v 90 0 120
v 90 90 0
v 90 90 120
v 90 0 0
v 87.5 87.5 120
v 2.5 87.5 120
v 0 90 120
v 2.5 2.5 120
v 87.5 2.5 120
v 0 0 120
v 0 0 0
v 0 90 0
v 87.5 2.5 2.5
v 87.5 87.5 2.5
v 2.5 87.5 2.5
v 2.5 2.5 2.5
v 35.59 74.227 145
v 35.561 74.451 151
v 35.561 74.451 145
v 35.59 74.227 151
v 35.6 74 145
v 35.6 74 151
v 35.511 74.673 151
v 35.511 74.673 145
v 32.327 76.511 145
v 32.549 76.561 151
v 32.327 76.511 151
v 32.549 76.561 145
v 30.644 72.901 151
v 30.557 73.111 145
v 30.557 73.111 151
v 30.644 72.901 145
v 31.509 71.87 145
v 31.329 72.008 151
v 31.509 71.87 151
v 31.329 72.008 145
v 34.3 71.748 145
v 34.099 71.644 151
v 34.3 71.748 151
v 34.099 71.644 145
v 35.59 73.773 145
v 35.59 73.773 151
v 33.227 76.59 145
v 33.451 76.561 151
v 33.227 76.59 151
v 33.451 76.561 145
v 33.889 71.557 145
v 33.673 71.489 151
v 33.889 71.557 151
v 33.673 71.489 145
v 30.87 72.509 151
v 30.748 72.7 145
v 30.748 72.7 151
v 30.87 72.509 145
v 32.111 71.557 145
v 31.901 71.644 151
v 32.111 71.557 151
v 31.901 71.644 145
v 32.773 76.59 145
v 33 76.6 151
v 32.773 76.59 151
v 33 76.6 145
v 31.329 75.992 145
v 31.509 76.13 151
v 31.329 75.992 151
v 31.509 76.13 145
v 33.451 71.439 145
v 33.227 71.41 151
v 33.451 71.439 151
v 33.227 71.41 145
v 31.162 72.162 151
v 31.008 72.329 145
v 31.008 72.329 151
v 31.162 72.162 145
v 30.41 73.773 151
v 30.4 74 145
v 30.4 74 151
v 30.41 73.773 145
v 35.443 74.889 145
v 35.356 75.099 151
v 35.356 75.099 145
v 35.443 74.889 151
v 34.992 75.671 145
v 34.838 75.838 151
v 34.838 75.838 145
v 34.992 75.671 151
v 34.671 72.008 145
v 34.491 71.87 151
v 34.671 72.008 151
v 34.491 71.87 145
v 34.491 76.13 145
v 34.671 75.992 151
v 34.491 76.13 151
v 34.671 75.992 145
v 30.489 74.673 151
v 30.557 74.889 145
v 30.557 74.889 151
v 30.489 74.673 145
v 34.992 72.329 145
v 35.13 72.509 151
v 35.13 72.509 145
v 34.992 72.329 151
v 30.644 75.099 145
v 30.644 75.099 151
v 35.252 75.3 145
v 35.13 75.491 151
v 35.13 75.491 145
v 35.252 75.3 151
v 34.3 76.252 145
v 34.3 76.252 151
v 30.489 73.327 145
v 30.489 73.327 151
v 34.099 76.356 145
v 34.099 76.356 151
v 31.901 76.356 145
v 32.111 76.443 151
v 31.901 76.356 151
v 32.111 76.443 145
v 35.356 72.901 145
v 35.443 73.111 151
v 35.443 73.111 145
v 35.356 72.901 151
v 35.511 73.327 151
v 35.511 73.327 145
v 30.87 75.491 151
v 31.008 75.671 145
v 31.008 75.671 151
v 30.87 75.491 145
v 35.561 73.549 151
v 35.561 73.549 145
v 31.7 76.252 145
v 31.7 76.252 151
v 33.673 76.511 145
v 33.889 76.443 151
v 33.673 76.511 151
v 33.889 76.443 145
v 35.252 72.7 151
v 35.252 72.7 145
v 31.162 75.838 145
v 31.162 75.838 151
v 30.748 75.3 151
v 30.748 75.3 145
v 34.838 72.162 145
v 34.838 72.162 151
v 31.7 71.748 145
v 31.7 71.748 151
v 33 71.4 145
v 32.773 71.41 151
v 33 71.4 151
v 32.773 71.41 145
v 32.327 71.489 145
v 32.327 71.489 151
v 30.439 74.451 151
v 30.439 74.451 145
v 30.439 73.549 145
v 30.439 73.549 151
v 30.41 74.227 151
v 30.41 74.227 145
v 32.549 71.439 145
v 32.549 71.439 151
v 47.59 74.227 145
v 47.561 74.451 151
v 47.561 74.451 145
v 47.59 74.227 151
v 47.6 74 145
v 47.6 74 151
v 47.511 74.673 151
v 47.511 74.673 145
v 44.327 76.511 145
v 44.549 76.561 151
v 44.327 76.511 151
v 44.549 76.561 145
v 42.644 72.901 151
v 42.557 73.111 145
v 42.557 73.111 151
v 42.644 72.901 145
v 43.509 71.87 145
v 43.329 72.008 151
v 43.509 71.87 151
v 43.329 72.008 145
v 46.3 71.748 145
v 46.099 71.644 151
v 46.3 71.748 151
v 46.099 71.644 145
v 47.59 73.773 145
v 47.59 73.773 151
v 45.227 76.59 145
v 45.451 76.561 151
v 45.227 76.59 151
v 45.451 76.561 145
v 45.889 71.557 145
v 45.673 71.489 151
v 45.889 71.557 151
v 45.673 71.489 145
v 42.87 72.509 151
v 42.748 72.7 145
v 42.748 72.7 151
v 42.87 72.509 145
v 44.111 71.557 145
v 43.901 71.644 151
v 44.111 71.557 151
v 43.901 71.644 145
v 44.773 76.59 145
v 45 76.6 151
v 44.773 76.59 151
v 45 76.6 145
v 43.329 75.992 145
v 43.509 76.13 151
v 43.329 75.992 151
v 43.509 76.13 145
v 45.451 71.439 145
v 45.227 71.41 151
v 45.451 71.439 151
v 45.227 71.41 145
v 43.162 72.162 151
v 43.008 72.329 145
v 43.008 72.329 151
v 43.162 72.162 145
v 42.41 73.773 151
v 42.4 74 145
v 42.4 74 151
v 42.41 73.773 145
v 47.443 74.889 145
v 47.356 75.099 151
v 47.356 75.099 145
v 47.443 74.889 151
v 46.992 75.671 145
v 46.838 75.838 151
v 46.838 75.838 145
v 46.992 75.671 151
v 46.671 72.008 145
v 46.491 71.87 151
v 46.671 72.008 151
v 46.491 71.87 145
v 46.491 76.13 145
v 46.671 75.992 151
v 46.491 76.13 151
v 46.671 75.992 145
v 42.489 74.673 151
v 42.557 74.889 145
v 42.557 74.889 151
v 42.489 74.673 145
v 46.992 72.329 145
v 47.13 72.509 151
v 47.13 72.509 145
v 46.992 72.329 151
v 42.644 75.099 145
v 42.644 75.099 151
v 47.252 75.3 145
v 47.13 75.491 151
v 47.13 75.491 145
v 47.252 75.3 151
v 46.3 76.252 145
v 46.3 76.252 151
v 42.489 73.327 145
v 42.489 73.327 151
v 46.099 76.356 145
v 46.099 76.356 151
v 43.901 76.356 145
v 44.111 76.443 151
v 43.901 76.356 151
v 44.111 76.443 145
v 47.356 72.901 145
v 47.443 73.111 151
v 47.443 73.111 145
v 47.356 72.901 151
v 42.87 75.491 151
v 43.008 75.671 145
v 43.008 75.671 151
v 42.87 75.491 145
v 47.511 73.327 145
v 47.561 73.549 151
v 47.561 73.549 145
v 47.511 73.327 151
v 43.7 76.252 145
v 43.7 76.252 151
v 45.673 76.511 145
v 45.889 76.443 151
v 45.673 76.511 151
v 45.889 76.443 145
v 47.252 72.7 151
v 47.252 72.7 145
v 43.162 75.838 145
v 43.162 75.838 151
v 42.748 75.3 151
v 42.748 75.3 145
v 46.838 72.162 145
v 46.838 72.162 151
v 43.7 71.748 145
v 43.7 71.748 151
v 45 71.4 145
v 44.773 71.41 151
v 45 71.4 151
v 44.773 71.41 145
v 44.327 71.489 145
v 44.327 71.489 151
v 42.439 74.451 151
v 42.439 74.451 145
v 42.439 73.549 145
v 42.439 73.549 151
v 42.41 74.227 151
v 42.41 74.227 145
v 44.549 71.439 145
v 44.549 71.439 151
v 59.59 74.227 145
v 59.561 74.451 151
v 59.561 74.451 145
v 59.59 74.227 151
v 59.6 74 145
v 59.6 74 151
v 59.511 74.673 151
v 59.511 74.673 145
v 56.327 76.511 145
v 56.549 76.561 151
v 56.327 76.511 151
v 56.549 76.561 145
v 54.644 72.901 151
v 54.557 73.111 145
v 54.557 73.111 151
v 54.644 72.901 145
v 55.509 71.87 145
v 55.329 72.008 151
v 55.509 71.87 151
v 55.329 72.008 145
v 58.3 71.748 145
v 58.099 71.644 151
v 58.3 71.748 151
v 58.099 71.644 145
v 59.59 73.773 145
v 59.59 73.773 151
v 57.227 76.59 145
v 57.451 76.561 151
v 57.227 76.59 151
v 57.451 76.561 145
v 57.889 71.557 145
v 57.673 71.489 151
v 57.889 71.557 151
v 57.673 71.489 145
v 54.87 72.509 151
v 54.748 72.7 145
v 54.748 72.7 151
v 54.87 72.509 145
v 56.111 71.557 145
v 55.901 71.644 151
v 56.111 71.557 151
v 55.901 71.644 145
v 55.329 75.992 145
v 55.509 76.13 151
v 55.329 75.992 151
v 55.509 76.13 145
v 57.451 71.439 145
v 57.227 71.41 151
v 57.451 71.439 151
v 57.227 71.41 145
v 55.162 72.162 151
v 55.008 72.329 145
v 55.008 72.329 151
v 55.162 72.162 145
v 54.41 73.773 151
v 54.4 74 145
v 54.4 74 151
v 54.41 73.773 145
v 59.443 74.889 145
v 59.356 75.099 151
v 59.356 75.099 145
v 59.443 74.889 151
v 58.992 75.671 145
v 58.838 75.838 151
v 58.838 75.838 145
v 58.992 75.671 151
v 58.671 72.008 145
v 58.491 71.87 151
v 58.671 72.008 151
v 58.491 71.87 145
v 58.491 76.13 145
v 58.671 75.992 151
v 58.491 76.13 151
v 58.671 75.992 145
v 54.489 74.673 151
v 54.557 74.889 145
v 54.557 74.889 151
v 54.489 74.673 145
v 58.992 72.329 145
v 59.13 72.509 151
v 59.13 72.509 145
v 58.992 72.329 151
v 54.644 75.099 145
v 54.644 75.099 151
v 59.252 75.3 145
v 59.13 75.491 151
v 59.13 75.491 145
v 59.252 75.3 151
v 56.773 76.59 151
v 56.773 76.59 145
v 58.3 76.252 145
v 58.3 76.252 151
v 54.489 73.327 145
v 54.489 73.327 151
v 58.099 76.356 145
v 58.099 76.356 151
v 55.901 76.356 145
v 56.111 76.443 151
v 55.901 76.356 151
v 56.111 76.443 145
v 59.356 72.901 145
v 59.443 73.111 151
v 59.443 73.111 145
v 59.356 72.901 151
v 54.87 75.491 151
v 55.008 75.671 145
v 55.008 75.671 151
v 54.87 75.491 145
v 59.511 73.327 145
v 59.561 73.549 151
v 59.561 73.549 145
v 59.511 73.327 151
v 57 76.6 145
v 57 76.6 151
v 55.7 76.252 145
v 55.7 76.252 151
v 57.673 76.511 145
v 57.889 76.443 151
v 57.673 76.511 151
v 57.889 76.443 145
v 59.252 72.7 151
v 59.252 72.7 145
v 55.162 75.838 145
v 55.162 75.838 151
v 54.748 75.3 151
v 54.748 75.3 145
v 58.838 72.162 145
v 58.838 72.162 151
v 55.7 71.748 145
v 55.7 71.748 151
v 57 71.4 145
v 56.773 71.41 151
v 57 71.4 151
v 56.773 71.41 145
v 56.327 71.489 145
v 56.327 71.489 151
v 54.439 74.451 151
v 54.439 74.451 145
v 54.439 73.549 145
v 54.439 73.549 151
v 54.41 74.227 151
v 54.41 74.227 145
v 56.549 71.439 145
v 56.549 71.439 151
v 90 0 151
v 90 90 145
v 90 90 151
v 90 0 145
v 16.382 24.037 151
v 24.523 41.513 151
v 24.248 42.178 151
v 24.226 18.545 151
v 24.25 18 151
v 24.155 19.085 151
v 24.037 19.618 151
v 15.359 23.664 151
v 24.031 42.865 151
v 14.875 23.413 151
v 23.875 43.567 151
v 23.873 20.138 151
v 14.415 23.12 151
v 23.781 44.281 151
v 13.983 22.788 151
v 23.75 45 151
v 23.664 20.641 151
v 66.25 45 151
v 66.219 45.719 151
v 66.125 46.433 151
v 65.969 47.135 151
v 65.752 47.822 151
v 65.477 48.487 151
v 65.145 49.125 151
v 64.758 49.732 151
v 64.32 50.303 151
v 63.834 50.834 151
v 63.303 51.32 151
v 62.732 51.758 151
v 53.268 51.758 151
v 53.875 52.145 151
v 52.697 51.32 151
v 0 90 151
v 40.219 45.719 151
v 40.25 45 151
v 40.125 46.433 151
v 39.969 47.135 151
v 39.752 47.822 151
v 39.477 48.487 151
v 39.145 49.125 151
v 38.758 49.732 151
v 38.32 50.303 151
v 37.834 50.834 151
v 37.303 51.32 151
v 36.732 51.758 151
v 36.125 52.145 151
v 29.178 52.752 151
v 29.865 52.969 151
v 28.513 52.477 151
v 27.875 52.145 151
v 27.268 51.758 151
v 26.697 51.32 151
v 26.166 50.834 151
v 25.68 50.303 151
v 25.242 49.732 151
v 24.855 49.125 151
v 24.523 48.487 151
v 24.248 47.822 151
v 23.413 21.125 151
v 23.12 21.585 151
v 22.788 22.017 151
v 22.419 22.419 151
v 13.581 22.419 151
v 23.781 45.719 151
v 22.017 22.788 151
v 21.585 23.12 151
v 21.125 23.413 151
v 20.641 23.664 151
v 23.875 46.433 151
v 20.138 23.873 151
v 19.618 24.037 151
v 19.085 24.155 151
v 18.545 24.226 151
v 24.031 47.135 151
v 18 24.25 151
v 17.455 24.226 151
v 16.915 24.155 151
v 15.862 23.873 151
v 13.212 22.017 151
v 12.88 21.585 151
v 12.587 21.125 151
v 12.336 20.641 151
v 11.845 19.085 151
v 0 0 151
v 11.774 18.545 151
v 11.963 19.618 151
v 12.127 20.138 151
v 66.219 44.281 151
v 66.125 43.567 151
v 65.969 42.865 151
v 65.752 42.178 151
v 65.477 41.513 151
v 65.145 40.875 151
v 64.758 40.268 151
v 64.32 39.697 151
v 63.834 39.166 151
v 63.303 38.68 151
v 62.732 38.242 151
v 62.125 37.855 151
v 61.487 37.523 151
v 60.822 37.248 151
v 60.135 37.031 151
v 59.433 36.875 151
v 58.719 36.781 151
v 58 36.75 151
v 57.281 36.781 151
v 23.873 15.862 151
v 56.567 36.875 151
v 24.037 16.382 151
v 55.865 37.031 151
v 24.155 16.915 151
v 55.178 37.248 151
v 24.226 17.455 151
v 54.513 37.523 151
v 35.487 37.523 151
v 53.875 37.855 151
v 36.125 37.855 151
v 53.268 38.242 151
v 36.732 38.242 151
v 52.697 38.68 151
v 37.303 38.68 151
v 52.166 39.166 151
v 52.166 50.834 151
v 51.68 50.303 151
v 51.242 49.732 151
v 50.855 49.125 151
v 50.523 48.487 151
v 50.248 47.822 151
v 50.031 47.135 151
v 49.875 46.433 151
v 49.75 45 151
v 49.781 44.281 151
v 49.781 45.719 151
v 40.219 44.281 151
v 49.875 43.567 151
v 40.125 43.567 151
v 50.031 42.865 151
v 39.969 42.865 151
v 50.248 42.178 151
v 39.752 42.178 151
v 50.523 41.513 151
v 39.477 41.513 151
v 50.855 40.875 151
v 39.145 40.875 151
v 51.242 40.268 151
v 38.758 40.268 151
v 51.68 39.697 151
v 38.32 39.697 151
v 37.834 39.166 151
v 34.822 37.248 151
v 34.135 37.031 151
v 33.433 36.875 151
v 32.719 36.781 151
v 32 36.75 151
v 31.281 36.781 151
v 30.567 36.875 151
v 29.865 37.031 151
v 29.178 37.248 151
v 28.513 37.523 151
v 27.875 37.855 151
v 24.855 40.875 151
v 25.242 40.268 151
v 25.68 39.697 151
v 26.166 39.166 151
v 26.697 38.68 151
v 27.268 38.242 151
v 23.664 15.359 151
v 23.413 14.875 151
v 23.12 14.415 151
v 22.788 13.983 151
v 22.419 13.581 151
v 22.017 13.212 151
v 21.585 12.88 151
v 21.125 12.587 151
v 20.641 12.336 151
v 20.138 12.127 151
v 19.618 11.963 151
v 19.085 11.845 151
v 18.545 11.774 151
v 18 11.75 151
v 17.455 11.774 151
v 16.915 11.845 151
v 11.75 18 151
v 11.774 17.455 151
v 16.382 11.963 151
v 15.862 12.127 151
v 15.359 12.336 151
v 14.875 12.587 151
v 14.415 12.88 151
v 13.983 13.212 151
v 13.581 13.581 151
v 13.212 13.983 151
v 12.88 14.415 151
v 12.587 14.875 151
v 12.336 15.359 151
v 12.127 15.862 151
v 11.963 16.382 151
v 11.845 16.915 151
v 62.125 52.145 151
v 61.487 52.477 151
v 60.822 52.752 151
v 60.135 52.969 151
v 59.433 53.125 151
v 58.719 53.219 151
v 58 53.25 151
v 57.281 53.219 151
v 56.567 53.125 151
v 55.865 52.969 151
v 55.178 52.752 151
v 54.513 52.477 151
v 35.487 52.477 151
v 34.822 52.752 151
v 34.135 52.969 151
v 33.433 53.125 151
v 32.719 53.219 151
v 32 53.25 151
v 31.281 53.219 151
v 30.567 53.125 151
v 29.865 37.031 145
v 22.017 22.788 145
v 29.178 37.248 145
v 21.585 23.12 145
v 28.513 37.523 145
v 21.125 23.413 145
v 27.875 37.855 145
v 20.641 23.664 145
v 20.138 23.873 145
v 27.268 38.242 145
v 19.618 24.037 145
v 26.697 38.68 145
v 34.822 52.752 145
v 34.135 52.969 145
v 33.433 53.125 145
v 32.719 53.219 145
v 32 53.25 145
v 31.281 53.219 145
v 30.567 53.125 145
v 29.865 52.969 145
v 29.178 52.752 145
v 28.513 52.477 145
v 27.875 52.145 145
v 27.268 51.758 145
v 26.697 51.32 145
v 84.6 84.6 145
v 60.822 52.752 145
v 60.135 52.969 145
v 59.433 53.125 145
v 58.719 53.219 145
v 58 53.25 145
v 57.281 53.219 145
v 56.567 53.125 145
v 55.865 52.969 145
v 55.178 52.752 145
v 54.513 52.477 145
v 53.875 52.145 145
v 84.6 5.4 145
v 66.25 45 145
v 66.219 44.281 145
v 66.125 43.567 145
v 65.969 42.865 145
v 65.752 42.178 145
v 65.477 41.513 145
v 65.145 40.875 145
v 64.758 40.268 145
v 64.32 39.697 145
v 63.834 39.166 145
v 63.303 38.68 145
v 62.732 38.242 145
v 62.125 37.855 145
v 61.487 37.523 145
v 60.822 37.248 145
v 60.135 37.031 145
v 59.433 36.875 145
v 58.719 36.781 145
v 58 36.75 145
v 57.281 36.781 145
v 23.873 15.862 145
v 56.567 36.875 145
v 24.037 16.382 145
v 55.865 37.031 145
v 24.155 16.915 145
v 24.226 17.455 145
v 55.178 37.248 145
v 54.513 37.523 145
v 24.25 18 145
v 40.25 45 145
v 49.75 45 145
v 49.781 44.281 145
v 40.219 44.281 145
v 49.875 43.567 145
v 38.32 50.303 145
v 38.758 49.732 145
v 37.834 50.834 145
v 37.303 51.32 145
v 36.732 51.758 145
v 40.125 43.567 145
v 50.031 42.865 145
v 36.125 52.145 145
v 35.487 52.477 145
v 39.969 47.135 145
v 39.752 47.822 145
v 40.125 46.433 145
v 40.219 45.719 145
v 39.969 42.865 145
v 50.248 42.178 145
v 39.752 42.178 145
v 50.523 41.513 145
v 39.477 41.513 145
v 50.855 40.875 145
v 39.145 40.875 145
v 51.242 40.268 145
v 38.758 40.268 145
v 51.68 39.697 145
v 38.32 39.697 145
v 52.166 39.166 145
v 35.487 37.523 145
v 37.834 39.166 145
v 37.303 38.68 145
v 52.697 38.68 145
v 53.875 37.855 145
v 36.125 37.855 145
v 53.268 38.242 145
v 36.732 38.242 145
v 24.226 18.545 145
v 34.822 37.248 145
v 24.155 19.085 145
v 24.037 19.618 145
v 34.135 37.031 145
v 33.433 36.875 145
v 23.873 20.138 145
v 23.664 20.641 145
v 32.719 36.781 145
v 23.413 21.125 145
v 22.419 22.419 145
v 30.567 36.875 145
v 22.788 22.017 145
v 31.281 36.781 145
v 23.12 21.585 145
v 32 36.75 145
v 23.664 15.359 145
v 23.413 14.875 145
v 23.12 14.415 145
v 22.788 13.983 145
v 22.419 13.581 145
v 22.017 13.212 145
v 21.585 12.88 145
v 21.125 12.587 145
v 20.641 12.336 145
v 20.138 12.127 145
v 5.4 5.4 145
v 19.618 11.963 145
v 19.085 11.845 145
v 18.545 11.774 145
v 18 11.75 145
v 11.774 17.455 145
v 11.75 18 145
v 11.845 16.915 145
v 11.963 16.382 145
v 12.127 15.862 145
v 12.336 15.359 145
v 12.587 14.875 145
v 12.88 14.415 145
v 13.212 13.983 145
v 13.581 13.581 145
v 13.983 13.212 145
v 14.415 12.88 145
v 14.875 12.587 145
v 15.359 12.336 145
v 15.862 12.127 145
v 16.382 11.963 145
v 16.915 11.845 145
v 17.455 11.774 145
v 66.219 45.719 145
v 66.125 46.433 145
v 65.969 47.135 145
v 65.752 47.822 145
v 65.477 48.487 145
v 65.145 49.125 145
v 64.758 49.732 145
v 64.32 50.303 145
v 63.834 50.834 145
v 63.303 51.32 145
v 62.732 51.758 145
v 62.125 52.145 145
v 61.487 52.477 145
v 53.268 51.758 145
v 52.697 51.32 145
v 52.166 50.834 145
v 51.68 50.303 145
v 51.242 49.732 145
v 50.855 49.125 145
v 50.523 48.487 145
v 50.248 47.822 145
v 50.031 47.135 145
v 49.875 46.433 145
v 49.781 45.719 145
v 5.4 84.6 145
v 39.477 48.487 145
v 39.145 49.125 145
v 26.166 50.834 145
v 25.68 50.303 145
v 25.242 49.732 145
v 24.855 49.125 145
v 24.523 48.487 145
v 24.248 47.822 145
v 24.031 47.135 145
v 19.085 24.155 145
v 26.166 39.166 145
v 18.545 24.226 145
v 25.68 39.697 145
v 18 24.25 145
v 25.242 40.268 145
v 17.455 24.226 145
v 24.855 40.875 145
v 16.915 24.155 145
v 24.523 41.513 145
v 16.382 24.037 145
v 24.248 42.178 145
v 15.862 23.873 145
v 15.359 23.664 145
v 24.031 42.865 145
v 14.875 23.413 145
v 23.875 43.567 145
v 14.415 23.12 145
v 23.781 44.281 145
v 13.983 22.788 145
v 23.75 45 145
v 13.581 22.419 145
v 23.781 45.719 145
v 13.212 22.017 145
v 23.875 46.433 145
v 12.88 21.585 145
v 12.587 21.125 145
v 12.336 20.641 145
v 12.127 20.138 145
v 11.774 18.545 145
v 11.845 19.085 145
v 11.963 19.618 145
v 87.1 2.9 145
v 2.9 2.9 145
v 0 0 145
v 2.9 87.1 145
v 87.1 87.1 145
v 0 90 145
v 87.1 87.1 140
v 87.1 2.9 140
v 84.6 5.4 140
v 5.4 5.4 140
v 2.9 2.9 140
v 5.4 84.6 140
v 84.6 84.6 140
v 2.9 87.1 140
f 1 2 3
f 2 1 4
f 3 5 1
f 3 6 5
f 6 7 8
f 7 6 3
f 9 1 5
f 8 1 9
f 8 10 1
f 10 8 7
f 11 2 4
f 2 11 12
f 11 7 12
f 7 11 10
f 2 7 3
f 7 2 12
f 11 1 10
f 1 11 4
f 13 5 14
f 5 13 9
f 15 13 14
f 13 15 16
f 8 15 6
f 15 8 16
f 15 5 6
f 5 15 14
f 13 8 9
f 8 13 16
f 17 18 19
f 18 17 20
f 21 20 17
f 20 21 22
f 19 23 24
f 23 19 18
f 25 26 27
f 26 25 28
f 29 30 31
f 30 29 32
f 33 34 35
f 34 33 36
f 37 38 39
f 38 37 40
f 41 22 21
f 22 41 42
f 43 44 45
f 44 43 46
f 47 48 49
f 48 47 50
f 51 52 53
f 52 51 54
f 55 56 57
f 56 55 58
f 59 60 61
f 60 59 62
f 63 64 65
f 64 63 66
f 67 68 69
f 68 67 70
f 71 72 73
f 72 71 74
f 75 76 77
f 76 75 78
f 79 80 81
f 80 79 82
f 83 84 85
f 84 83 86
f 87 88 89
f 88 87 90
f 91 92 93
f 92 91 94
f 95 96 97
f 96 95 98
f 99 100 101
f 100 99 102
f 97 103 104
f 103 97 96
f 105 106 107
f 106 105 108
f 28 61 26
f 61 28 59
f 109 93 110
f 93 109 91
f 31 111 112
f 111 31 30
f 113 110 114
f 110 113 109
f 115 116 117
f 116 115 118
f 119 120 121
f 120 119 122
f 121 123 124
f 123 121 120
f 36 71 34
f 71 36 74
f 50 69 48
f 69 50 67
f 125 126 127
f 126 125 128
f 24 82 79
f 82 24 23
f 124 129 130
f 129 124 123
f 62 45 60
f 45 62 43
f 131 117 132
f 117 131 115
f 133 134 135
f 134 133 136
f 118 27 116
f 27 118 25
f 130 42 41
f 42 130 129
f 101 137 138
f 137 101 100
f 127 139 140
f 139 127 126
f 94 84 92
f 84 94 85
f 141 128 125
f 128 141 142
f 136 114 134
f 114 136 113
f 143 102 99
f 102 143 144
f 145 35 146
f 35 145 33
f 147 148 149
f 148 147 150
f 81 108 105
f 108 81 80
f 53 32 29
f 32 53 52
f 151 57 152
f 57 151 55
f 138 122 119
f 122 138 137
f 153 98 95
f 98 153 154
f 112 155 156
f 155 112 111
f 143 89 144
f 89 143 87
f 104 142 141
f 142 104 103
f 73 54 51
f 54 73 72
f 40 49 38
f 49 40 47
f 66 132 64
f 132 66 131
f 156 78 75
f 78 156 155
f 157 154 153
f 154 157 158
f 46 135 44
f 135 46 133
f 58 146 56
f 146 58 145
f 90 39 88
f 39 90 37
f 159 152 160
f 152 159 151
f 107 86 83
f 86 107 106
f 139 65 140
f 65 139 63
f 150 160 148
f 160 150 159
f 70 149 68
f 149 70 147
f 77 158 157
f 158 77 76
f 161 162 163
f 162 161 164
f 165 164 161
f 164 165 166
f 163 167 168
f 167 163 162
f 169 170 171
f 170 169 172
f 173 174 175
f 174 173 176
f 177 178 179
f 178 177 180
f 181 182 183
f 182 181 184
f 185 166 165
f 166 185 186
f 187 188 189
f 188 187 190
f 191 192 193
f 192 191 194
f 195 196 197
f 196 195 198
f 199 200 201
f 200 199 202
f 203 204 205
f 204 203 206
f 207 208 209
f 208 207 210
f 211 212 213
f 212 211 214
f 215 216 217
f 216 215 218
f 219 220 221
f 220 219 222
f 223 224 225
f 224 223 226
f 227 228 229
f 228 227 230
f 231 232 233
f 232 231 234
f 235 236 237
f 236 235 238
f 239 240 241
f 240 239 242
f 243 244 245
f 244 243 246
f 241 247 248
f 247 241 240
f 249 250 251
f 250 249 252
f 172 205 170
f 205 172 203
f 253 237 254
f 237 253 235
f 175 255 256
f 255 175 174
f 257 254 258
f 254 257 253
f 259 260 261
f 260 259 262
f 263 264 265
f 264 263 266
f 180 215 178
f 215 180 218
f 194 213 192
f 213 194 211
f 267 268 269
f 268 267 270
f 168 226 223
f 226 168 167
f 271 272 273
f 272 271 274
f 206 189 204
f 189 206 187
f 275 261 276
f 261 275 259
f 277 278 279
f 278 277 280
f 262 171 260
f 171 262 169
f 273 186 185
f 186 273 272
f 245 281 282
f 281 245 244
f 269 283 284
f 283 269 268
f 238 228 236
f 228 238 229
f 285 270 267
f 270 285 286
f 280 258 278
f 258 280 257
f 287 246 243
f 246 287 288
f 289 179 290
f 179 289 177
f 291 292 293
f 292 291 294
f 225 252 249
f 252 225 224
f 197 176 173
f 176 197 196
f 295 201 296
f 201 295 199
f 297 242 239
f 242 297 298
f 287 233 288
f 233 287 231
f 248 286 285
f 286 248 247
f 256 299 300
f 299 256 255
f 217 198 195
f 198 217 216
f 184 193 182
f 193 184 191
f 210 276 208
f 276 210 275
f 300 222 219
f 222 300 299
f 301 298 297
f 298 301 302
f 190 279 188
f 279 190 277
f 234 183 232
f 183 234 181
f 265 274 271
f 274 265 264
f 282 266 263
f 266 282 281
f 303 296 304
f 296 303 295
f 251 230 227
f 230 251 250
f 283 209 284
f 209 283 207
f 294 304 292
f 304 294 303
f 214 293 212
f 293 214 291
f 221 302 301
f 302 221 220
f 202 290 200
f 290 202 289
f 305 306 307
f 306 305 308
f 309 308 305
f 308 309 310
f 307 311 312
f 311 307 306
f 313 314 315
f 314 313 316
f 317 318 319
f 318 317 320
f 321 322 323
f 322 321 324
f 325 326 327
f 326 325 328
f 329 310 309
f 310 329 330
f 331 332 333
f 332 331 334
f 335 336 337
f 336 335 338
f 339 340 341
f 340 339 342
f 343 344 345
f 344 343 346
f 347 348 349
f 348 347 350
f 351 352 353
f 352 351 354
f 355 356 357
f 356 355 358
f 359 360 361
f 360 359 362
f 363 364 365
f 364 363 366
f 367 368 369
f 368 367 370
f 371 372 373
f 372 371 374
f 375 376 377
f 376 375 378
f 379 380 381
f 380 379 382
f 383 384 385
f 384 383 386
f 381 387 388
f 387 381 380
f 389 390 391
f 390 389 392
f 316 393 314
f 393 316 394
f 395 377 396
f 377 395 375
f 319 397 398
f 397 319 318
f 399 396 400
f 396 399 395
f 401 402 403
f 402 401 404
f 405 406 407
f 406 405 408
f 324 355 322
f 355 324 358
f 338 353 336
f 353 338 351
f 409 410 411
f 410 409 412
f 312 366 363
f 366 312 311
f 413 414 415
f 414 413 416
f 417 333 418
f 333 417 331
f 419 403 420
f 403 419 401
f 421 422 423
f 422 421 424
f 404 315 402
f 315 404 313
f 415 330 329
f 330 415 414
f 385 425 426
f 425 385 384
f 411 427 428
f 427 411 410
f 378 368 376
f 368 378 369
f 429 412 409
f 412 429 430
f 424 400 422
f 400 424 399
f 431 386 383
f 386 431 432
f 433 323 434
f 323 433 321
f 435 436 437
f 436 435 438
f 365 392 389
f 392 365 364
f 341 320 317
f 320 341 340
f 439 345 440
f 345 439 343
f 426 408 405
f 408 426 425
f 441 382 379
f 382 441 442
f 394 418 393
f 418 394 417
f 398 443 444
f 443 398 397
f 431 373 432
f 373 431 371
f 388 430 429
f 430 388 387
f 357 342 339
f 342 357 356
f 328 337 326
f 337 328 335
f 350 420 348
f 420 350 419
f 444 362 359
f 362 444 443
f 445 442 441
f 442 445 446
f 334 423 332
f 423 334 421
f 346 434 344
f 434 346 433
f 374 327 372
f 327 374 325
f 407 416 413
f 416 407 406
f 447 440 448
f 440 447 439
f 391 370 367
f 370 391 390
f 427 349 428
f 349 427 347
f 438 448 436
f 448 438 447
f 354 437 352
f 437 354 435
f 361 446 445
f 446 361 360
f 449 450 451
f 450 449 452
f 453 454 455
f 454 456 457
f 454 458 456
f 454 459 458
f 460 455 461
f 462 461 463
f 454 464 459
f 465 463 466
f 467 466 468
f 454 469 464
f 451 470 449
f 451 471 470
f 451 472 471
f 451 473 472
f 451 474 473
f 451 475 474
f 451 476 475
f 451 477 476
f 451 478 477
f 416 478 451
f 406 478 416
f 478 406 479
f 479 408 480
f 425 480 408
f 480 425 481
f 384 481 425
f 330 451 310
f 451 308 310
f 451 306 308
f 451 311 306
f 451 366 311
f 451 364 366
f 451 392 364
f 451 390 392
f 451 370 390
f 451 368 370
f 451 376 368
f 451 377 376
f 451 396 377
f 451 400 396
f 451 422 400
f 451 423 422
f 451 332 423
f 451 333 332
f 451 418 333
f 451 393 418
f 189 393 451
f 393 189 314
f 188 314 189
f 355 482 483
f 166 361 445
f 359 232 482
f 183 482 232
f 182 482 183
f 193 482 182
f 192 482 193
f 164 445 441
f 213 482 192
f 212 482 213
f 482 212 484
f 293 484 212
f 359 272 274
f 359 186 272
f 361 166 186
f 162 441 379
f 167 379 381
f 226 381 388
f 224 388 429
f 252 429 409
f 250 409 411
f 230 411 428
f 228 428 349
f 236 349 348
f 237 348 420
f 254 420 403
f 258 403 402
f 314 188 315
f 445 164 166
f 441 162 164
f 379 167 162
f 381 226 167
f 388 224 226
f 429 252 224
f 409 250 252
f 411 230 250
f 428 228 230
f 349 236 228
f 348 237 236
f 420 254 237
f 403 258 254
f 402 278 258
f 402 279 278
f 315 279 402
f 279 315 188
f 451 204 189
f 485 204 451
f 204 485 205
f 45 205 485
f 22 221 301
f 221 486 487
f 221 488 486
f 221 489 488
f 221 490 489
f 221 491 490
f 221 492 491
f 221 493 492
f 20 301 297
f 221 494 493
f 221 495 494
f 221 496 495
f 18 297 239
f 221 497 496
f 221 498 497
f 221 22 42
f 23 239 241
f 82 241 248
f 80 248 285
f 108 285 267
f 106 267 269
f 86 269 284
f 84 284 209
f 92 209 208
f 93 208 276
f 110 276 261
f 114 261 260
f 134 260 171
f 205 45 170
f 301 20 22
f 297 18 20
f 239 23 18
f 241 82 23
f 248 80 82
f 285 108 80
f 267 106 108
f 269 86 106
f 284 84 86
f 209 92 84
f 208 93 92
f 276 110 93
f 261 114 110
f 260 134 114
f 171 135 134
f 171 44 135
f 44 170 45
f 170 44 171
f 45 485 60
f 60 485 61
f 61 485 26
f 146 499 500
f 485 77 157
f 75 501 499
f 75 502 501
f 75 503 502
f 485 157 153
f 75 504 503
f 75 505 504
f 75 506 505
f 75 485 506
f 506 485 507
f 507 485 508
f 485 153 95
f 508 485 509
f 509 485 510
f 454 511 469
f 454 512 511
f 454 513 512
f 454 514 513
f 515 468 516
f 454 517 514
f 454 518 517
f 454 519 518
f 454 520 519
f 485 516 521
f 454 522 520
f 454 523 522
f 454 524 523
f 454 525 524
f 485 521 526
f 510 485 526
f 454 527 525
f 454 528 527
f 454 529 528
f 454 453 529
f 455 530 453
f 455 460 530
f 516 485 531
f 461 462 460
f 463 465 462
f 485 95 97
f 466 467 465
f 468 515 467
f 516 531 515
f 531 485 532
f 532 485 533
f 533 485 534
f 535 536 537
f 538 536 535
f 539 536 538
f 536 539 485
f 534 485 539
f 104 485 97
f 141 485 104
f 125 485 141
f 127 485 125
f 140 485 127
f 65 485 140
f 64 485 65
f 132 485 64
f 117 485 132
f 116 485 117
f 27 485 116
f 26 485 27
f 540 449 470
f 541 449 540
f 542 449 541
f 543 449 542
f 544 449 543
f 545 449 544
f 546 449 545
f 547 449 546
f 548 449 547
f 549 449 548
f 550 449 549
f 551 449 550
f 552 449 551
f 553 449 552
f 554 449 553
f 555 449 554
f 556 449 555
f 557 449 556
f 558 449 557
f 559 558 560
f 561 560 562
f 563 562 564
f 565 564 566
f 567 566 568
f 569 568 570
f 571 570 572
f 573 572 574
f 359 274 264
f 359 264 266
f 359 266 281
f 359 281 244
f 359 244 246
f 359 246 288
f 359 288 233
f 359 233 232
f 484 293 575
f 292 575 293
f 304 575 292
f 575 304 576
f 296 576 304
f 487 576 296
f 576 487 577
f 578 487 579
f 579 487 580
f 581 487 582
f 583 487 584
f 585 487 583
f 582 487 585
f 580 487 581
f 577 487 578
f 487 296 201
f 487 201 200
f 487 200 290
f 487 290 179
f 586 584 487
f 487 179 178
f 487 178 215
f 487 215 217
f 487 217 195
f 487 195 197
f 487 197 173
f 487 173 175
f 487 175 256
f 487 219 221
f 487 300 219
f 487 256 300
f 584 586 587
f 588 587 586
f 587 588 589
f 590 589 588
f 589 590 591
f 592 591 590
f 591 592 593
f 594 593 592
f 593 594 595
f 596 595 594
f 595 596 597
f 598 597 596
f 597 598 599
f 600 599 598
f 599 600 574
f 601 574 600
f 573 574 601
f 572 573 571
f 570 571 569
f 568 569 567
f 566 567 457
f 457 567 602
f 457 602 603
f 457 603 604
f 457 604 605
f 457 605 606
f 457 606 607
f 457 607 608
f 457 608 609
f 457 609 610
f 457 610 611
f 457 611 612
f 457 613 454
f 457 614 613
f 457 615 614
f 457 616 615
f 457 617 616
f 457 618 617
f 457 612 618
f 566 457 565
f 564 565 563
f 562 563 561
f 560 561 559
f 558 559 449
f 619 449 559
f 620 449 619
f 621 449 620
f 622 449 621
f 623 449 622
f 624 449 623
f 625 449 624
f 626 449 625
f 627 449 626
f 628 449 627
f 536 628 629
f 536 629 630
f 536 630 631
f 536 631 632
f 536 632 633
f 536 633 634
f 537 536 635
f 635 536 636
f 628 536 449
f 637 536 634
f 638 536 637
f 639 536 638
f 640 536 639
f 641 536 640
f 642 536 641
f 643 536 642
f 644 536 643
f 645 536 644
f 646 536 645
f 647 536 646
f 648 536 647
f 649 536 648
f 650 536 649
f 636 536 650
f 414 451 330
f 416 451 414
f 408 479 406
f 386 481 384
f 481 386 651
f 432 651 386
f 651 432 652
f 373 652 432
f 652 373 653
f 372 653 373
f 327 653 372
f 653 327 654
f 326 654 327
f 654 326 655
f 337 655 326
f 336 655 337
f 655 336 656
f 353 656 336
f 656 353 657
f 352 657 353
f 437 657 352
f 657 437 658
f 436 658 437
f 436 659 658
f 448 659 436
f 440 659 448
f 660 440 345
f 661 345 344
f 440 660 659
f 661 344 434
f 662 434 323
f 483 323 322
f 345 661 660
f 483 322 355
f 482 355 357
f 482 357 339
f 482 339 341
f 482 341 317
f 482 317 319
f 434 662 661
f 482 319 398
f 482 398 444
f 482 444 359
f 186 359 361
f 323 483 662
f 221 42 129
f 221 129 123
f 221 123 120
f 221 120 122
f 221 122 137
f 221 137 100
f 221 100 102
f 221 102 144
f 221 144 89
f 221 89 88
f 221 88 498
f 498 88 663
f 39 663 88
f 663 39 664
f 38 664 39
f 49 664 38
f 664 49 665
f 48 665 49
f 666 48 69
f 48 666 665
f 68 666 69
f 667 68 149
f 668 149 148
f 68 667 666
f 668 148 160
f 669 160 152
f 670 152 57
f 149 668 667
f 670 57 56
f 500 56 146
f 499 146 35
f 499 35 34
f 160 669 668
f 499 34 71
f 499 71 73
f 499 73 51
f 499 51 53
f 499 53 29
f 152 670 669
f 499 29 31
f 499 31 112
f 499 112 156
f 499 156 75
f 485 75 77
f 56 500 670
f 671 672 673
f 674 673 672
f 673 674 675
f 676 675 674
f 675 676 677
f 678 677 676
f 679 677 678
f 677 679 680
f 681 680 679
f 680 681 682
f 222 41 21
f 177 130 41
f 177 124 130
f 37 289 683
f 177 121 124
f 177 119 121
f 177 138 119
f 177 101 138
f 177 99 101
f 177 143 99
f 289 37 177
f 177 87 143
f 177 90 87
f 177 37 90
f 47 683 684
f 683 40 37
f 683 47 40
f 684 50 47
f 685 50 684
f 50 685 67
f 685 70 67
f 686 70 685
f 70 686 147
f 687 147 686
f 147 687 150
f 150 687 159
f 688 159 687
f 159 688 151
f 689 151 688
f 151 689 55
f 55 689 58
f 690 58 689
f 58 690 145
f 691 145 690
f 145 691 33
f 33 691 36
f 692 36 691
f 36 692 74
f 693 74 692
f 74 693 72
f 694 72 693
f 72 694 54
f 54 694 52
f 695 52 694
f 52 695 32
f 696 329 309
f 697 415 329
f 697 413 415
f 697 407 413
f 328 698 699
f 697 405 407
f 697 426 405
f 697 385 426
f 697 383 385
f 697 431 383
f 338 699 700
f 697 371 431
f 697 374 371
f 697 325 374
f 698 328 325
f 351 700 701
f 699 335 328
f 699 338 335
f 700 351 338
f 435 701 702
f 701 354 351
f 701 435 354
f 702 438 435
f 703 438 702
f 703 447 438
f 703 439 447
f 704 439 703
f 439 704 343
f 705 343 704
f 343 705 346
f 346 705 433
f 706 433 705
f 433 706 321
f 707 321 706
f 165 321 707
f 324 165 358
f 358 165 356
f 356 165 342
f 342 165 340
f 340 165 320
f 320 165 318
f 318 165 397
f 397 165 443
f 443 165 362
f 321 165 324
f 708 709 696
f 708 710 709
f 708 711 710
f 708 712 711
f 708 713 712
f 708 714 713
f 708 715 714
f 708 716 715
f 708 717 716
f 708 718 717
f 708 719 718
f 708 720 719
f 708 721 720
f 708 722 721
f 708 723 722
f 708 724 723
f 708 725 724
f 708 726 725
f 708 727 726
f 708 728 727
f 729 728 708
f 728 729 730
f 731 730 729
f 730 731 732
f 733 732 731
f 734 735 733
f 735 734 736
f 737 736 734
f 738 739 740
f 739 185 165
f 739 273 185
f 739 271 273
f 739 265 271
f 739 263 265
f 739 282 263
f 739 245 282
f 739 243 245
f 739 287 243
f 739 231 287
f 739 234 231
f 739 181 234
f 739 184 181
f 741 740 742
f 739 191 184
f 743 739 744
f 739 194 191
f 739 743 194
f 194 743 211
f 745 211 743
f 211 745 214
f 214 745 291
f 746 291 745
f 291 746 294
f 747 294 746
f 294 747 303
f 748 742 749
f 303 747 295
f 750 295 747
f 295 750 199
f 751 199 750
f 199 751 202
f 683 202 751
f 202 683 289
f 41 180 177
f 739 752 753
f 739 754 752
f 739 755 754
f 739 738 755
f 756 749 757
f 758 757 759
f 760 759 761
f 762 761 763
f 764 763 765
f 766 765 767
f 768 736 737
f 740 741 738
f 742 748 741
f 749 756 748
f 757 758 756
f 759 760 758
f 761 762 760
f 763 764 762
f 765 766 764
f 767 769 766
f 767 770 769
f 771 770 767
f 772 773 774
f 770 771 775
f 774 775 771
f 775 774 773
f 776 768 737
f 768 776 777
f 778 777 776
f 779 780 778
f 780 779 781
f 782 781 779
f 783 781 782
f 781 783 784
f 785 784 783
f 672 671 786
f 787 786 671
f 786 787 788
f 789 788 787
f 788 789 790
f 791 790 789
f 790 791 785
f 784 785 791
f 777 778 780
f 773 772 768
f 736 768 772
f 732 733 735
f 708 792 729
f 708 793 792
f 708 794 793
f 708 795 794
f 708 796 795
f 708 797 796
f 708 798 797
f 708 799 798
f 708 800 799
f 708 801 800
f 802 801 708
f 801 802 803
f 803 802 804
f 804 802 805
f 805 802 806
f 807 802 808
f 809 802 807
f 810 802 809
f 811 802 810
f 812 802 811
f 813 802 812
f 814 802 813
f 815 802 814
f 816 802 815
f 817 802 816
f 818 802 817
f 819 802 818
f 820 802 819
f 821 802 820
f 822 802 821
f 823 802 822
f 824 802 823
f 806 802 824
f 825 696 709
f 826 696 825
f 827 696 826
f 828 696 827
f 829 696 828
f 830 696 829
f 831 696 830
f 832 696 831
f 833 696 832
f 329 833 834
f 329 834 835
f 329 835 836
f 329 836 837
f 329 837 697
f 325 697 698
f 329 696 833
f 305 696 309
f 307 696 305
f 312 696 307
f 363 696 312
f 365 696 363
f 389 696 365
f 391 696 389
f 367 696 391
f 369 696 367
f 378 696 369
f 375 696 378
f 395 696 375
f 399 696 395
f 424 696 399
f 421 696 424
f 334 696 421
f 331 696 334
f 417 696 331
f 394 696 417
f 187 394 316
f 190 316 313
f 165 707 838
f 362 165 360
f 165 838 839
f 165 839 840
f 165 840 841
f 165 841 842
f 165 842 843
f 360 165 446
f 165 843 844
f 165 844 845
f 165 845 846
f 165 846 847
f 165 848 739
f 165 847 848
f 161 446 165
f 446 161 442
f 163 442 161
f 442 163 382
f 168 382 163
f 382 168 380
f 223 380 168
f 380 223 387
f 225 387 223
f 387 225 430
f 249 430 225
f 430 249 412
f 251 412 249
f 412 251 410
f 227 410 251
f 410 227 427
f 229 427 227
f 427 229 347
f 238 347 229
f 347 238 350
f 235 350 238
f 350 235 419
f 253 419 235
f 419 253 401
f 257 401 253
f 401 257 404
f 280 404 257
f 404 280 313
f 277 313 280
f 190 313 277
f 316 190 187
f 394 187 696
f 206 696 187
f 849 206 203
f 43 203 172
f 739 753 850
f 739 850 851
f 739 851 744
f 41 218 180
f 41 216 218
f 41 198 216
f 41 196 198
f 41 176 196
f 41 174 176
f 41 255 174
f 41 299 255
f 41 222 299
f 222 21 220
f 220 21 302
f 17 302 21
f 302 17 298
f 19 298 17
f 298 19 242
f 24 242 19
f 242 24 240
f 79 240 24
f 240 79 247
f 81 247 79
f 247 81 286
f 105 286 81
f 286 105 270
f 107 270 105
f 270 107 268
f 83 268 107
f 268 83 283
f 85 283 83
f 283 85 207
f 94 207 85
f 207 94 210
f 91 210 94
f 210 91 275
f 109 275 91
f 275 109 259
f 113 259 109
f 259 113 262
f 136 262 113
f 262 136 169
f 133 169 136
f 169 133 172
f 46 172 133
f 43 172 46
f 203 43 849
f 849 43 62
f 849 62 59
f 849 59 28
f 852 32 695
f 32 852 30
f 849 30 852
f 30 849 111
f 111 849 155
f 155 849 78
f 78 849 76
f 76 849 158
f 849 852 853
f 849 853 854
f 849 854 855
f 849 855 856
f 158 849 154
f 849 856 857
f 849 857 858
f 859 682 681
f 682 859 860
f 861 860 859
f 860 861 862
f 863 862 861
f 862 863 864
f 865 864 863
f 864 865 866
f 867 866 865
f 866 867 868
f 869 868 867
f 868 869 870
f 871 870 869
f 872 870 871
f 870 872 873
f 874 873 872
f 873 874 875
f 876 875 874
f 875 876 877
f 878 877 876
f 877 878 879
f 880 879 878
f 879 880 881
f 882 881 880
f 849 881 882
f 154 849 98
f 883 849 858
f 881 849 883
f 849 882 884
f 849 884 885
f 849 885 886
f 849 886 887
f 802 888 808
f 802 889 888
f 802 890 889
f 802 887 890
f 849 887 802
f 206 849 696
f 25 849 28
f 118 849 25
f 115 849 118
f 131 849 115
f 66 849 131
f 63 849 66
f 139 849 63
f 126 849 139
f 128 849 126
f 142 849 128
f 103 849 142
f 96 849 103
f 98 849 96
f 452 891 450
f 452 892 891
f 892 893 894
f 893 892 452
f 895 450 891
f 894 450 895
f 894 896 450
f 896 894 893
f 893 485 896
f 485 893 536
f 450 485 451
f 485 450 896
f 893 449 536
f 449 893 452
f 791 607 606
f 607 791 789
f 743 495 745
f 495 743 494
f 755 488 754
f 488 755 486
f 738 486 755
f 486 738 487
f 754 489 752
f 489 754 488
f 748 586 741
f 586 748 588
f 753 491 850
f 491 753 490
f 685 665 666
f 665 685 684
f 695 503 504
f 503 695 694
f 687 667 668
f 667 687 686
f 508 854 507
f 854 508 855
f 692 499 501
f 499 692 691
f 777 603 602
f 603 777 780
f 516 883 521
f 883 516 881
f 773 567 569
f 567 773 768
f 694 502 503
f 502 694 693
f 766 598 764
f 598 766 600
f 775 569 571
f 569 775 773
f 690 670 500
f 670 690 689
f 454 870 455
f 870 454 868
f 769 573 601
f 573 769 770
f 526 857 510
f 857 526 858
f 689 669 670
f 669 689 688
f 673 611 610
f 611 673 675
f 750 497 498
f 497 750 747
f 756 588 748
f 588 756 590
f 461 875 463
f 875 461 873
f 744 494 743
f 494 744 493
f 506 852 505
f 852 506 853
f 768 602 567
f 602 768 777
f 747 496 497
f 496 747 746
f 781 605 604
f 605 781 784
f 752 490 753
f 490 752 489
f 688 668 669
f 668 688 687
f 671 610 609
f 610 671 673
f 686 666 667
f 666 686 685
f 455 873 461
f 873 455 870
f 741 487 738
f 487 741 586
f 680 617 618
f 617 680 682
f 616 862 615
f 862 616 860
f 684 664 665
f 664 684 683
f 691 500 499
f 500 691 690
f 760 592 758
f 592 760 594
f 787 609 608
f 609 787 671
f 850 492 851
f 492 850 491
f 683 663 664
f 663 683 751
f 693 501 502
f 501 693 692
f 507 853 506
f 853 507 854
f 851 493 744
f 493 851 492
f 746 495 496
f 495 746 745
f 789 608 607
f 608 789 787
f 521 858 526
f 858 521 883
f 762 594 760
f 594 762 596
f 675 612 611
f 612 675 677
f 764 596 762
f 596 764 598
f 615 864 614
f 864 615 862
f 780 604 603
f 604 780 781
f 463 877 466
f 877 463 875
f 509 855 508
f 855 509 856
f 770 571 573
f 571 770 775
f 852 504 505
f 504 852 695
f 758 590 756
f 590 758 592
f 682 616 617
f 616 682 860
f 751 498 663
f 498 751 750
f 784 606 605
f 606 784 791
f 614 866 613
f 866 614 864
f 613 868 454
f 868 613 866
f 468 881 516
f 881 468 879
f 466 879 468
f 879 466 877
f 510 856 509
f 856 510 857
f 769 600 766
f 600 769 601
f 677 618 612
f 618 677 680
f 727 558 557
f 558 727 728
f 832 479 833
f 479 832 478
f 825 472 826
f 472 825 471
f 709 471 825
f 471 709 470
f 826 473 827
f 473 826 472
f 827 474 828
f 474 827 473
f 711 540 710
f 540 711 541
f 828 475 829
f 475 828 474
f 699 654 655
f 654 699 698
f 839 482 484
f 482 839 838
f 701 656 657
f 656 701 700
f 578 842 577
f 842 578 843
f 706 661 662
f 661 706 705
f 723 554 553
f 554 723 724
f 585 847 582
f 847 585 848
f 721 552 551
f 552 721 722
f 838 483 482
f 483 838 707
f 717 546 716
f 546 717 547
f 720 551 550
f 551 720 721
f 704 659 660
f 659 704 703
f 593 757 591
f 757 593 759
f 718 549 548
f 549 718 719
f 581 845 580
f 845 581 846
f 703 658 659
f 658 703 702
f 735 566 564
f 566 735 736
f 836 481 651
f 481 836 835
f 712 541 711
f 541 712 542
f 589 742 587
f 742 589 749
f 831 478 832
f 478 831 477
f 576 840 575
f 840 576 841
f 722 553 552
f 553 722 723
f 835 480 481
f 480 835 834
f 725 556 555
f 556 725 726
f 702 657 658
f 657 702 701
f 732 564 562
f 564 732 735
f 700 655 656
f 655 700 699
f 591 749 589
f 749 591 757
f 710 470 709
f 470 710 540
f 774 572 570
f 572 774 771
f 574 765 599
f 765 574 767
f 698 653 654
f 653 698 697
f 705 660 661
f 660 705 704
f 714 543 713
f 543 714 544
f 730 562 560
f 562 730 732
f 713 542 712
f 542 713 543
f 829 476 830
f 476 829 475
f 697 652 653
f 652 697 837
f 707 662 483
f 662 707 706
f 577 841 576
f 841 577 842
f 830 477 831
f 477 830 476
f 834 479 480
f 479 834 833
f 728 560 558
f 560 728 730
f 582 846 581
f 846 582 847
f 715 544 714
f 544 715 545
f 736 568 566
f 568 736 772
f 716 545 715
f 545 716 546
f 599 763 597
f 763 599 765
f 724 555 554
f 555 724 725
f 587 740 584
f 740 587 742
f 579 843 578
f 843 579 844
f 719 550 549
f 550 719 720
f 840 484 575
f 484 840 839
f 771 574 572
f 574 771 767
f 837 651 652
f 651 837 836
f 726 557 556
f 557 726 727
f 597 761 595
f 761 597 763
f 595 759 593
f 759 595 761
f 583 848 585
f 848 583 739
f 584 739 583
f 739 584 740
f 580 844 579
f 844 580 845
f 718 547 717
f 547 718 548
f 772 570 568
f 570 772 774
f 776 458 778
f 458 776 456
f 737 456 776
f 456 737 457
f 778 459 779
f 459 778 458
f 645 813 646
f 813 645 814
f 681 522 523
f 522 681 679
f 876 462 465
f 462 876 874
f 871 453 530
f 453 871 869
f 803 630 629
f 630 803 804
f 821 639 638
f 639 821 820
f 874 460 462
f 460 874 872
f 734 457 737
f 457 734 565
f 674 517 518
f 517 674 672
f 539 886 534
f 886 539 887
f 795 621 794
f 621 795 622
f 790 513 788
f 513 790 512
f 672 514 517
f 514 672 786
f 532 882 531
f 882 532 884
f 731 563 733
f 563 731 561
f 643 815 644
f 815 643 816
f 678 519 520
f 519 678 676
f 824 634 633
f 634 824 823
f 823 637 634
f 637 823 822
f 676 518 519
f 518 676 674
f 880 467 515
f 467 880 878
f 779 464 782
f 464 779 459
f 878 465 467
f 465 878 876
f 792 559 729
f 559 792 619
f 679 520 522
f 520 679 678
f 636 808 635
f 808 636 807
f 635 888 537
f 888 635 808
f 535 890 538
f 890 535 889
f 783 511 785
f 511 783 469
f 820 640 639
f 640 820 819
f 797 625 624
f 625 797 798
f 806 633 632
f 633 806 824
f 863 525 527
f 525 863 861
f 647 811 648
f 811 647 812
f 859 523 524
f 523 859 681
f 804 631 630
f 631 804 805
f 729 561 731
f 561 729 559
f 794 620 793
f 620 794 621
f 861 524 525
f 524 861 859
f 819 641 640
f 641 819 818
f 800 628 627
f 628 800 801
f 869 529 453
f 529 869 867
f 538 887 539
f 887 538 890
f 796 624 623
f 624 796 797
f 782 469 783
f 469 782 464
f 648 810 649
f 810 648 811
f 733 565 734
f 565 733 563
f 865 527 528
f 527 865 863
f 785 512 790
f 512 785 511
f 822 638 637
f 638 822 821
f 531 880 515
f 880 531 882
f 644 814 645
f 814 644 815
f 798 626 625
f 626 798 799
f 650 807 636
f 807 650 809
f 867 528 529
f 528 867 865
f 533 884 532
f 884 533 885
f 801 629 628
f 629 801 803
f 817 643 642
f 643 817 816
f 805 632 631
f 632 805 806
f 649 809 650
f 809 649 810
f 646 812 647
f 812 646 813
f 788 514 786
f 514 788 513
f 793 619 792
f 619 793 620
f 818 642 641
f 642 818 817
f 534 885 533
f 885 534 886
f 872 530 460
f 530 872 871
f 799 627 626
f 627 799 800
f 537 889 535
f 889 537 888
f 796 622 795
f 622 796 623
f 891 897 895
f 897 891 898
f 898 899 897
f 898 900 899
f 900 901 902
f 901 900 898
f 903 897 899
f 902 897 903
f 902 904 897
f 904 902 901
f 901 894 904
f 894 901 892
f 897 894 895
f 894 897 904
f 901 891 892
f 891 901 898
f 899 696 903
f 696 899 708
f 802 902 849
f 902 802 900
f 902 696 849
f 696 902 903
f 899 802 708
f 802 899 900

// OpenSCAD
// ============================================================
//  GeoGreen - Carcasa de la maqueta (parametrico, OpenSCAD)
//  Caja-contenedor + tapa con huecos para el sensor HC-SR04,
//  el semaforo de 3 LEDs y el buzzer.
//
//  Render (vista ensamble):
//    openscad -o carcasa.png --viewall --autocenter carcasa.scad
//  Exportar piezas para imprimir:
//    openscad -D "parte=\"contenedor\"" -o contenedor.stl carcasa.scad
//    openscad -D "parte=\"tapa\""       -o tapa.stl       carcasa.scad
// ============================================================

parte = "ensamble";   // "contenedor" | "tapa" | "ensamble"

$fn = 72;

// --- Parametros del contenedor (mm) ---
ancho = 90;     // X
fondo = 90;     // Y
alto  = 120;    // altura
pared = 2.5;    // espesor de pared
tapa_h = 6;     // espesor de la tapa
holgura = 0.4;  // juego para que la tapa calce

// --- Sensor HC-SR04 ---
sep_ojos = 26;  // separacion entre centros de los transductores
d_ojo = 16.5;   // diametro de cada transductor

// --- LEDs del semaforo ---
d_led = 5.2;
sep_led = 12;

// --- Buzzer ---
d_buzzer = 12.5;

module contenedor() {
  difference() {
    cube([ancho, fondo, alto]);
    // hueco interior, abierto por arriba
    translate([pared, pared, pared])
      cube([ancho - 2*pared, fondo - 2*pared, alto]);
  }
}

module tapa() {
  union() {
    difference() {
      cube([ancho, fondo, tapa_h]);
      // dos "ojos" del sensor mirando hacia abajo, al centro
      translate([ancho/2 - sep_ojos/2, fondo/2, -1]) cylinder(h = tapa_h + 2, d = d_ojo);
      translate([ancho/2 + sep_ojos/2, fondo/2, -1]) cylinder(h = tapa_h + 2, d = d_ojo);
      // fila de 3 LEDs (semaforo)
      for (i = [-1, 0, 1])
        translate([ancho/2 + i*sep_led, fondo - 16, -1]) cylinder(h = tapa_h + 2, d = d_led);
      // buzzer
      translate([18, 18, -1]) cylinder(h = tapa_h + 2, d = d_buzzer);
    }
    // faldon interior para que la tapa encaje en el contenedor
    translate([pared + holgura, pared + holgura, -5])
      difference() {
        cube([ancho - 2*(pared + holgura), fondo - 2*(pared + holgura), 5]);
        translate([pared, pared, -1])
          cube([ancho - 2*(pared + holgura) - 2*pared,
                fondo - 2*(pared + holgura) - 2*pared, 7]);
      }
  }
}

if (parte == "contenedor") {
  contenedor();
} else if (parte == "tapa") {
  tapa();
} else {
  // vista ensamble (explosionada) para el render
  color("SeaGreen")  contenedor();
  color("Gainsboro") translate([0, 0, alto + 25]) tapa();
}
